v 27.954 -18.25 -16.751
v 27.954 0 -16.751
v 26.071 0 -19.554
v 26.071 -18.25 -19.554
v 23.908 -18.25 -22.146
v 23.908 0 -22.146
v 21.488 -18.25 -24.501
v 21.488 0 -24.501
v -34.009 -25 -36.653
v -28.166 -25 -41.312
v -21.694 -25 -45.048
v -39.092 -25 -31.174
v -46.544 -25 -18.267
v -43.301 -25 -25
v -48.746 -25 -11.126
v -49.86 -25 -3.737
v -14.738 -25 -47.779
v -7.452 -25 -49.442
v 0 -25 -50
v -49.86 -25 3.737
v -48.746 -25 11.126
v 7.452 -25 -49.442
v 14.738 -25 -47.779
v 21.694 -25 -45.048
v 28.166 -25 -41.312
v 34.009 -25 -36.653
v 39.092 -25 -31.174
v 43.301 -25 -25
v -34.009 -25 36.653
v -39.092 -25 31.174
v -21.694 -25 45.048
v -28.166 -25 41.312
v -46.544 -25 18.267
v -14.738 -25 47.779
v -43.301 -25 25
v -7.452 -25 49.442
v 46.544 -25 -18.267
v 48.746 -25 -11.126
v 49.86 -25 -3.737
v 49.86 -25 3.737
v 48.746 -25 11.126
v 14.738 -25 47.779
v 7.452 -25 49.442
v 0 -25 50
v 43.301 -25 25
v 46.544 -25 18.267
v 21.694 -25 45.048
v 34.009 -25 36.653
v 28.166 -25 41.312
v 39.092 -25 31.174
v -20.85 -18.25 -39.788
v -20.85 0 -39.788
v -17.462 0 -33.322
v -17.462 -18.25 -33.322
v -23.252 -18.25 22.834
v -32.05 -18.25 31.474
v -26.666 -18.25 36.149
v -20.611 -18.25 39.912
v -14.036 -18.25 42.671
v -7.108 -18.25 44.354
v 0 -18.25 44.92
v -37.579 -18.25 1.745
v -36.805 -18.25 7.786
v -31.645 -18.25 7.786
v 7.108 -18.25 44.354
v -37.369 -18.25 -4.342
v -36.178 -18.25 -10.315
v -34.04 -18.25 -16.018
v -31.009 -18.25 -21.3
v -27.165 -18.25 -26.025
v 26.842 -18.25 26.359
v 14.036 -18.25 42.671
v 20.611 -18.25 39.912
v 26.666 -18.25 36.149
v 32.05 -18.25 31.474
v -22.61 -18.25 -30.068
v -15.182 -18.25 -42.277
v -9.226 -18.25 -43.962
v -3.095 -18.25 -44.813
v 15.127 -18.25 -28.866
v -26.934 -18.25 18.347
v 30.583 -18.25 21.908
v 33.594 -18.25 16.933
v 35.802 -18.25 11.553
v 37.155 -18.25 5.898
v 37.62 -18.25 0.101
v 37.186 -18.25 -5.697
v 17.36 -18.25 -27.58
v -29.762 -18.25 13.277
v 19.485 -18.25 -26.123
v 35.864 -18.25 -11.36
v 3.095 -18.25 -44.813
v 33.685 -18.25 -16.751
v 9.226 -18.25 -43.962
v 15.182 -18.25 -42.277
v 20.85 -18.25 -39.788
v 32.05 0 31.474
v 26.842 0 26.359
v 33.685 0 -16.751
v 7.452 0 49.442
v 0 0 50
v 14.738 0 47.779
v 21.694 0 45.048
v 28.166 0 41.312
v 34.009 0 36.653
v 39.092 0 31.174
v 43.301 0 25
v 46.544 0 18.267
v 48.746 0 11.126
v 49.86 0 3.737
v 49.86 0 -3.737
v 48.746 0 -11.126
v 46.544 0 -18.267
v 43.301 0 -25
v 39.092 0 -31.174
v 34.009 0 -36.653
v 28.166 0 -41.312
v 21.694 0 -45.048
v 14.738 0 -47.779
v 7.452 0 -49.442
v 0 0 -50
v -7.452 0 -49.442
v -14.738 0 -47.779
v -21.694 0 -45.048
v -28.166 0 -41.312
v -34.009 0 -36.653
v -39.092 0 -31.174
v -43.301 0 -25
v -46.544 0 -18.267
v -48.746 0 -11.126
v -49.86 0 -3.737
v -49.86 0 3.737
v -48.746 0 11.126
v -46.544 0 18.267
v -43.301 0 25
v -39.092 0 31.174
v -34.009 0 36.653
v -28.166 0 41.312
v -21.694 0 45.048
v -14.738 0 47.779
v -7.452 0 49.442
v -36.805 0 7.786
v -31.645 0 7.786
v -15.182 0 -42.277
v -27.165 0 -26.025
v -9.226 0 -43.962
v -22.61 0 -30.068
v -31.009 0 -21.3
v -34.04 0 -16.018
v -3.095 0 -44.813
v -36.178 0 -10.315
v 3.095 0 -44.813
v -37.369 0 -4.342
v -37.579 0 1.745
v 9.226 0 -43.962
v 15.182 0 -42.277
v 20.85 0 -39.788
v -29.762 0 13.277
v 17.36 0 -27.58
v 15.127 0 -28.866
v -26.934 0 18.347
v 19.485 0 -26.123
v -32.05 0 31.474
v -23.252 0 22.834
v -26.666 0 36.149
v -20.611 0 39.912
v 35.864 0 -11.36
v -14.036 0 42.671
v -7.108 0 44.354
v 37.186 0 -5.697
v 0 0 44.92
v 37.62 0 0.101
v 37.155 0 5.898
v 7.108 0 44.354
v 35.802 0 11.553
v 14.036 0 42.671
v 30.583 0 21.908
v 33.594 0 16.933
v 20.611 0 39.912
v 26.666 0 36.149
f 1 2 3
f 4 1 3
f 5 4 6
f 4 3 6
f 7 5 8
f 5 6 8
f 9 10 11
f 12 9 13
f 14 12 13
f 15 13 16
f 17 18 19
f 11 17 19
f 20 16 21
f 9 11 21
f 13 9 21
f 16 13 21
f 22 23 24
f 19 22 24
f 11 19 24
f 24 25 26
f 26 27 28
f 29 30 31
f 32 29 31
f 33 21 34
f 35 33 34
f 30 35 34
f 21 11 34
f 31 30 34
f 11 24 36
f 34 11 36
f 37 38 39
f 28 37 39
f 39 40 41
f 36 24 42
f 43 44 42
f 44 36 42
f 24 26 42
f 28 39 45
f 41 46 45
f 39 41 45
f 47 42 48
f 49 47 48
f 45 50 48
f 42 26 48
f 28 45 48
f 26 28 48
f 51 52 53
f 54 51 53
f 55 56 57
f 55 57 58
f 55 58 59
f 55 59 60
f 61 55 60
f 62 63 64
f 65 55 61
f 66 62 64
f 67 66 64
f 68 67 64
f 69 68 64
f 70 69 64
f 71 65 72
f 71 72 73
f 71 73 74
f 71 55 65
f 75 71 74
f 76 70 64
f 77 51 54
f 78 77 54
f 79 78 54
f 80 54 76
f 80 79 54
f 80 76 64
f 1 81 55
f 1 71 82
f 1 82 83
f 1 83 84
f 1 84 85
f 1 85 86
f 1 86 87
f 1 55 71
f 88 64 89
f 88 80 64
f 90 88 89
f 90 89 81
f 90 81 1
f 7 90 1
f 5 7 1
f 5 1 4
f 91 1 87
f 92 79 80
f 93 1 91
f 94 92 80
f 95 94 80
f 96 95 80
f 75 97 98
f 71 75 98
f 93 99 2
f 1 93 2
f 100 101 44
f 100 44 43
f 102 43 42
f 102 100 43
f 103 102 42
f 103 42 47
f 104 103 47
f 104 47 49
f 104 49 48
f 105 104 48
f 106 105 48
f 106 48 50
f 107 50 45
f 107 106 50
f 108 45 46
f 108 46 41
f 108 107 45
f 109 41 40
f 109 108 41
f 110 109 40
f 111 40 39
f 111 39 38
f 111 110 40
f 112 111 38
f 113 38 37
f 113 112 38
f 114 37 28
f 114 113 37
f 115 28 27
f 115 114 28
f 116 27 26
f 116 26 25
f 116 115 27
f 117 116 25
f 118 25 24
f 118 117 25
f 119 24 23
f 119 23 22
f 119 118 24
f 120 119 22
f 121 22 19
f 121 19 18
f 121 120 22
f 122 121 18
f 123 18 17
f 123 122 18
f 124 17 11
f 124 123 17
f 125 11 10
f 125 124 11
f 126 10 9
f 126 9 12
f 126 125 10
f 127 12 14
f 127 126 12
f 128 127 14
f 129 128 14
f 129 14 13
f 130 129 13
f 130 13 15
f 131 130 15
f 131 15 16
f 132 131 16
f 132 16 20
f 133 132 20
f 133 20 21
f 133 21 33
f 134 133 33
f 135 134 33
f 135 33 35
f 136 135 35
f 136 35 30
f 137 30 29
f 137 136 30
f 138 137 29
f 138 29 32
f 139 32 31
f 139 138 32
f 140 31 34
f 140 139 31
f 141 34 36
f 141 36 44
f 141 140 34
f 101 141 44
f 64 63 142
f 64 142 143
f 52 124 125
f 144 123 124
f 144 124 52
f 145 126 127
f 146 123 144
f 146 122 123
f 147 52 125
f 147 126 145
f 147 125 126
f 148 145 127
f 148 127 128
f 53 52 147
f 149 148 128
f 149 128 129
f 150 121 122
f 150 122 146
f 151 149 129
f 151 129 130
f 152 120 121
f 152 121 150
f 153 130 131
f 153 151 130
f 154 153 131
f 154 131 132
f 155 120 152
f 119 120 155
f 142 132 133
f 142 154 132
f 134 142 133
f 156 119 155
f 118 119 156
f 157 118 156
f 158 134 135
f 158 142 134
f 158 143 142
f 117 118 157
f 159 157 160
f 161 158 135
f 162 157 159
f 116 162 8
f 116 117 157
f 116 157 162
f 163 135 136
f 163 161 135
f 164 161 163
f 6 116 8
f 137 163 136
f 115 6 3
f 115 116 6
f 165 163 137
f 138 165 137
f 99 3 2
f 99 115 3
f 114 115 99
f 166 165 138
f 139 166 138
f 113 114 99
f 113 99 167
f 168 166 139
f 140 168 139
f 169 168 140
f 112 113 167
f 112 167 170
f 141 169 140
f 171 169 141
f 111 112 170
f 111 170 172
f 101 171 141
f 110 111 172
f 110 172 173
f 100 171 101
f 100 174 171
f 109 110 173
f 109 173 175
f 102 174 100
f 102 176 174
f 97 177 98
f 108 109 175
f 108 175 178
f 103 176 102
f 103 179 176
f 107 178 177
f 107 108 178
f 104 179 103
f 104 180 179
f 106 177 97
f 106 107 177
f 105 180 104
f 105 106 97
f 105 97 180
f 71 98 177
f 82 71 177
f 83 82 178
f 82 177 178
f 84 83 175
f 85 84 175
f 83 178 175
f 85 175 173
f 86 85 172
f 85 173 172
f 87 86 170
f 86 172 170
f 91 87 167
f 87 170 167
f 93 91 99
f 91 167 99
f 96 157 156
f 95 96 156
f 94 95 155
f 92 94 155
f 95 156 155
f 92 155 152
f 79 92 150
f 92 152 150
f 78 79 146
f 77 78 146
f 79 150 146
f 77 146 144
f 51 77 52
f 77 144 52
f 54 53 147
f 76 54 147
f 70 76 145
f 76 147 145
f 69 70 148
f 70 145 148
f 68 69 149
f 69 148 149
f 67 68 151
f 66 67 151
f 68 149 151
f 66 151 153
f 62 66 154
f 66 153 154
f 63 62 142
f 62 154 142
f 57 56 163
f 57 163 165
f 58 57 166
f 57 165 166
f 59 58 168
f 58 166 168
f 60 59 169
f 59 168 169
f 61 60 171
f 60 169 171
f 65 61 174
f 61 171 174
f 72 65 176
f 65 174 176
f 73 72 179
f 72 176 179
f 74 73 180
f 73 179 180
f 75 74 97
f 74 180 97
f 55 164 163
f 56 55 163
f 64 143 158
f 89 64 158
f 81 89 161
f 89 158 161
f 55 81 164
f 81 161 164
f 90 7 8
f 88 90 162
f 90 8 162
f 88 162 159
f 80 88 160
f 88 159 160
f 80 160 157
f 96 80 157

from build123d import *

# Parameters (mm, degrees)
SKETCH1_R           = 50
BOSS_EXTRUDE1_DEPTH = 25
CUT_EXTRUDE1_DEPTH  = 18.25


with BuildPart() as part:
    # Sketch1 → Boss-Extrude1 (new body)
    with BuildSketch(Plane(origin=(0, 0, 0), x_dir=(1, 0, 0), z_dir=(0, 1, 0))):
        with Locations(Location((0, 0, 0), (0, 0, 270))):
            Circle(SKETCH1_R)
    extrude(amount=-BOSS_EXTRUDE1_DEPTH)

    # Sketch2 → Cut-Extrude1 (cut)
    with BuildSketch(Plane(origin=(0, 0, 0), x_dir=(1, 0, 0), z_dir=(0, 1, 0))):
        with BuildLine():
            Line((-20.85, 39.78798688), (-17.461642921, 33.321996136))
            ThreePointArc((-17.461642921, 33.321996136), (-34.039720295, 16.017547946), (-36.805386336, -7.786394331))
            Line((-36.805386336, -7.786394331), (-31.645347938, -7.786394331))
            ThreePointArc((-31.645347938, -7.786394331), (-28.461211468, -15.874993686), (-23.252089779, -22.834103961))
            Line((-23.252089779, -22.834103961), (-32.05, -31.473860583))
            ThreePointArc((-32.05, -31.473860583), (0, -44.92), (32.05, -31.473860583))
            Line((32.05, -31.473860583), (26.841518255, -26.359007906))
            ThreePointArc((26.841518255, -26.359007906), (37.154813328, -5.897817101), (33.684688853, 16.751302542))
            Line((33.684688853, 16.751302542), (27.954424443, 16.751302542))
            ThreePointArc((27.954424443, 16.751302542), (25.023160627, 20.878156409), (21.488186441, 24.501302542))
            ThreePointArc((21.488186441, 24.501302542), (18.436983495, 26.872544025), (15.126554505, 28.865954542))
            Line((15.126554505, 28.865954542), (20.85, 39.78798688))
            ThreePointArc((20.85, 39.78798688), (0, 44.92), (-20.85, 39.78798688))
        make_face()
    extrude(amount=-CUT_EXTRUDE1_DEPTH, mode=Mode.SUBTRACT)


solid = part.part
